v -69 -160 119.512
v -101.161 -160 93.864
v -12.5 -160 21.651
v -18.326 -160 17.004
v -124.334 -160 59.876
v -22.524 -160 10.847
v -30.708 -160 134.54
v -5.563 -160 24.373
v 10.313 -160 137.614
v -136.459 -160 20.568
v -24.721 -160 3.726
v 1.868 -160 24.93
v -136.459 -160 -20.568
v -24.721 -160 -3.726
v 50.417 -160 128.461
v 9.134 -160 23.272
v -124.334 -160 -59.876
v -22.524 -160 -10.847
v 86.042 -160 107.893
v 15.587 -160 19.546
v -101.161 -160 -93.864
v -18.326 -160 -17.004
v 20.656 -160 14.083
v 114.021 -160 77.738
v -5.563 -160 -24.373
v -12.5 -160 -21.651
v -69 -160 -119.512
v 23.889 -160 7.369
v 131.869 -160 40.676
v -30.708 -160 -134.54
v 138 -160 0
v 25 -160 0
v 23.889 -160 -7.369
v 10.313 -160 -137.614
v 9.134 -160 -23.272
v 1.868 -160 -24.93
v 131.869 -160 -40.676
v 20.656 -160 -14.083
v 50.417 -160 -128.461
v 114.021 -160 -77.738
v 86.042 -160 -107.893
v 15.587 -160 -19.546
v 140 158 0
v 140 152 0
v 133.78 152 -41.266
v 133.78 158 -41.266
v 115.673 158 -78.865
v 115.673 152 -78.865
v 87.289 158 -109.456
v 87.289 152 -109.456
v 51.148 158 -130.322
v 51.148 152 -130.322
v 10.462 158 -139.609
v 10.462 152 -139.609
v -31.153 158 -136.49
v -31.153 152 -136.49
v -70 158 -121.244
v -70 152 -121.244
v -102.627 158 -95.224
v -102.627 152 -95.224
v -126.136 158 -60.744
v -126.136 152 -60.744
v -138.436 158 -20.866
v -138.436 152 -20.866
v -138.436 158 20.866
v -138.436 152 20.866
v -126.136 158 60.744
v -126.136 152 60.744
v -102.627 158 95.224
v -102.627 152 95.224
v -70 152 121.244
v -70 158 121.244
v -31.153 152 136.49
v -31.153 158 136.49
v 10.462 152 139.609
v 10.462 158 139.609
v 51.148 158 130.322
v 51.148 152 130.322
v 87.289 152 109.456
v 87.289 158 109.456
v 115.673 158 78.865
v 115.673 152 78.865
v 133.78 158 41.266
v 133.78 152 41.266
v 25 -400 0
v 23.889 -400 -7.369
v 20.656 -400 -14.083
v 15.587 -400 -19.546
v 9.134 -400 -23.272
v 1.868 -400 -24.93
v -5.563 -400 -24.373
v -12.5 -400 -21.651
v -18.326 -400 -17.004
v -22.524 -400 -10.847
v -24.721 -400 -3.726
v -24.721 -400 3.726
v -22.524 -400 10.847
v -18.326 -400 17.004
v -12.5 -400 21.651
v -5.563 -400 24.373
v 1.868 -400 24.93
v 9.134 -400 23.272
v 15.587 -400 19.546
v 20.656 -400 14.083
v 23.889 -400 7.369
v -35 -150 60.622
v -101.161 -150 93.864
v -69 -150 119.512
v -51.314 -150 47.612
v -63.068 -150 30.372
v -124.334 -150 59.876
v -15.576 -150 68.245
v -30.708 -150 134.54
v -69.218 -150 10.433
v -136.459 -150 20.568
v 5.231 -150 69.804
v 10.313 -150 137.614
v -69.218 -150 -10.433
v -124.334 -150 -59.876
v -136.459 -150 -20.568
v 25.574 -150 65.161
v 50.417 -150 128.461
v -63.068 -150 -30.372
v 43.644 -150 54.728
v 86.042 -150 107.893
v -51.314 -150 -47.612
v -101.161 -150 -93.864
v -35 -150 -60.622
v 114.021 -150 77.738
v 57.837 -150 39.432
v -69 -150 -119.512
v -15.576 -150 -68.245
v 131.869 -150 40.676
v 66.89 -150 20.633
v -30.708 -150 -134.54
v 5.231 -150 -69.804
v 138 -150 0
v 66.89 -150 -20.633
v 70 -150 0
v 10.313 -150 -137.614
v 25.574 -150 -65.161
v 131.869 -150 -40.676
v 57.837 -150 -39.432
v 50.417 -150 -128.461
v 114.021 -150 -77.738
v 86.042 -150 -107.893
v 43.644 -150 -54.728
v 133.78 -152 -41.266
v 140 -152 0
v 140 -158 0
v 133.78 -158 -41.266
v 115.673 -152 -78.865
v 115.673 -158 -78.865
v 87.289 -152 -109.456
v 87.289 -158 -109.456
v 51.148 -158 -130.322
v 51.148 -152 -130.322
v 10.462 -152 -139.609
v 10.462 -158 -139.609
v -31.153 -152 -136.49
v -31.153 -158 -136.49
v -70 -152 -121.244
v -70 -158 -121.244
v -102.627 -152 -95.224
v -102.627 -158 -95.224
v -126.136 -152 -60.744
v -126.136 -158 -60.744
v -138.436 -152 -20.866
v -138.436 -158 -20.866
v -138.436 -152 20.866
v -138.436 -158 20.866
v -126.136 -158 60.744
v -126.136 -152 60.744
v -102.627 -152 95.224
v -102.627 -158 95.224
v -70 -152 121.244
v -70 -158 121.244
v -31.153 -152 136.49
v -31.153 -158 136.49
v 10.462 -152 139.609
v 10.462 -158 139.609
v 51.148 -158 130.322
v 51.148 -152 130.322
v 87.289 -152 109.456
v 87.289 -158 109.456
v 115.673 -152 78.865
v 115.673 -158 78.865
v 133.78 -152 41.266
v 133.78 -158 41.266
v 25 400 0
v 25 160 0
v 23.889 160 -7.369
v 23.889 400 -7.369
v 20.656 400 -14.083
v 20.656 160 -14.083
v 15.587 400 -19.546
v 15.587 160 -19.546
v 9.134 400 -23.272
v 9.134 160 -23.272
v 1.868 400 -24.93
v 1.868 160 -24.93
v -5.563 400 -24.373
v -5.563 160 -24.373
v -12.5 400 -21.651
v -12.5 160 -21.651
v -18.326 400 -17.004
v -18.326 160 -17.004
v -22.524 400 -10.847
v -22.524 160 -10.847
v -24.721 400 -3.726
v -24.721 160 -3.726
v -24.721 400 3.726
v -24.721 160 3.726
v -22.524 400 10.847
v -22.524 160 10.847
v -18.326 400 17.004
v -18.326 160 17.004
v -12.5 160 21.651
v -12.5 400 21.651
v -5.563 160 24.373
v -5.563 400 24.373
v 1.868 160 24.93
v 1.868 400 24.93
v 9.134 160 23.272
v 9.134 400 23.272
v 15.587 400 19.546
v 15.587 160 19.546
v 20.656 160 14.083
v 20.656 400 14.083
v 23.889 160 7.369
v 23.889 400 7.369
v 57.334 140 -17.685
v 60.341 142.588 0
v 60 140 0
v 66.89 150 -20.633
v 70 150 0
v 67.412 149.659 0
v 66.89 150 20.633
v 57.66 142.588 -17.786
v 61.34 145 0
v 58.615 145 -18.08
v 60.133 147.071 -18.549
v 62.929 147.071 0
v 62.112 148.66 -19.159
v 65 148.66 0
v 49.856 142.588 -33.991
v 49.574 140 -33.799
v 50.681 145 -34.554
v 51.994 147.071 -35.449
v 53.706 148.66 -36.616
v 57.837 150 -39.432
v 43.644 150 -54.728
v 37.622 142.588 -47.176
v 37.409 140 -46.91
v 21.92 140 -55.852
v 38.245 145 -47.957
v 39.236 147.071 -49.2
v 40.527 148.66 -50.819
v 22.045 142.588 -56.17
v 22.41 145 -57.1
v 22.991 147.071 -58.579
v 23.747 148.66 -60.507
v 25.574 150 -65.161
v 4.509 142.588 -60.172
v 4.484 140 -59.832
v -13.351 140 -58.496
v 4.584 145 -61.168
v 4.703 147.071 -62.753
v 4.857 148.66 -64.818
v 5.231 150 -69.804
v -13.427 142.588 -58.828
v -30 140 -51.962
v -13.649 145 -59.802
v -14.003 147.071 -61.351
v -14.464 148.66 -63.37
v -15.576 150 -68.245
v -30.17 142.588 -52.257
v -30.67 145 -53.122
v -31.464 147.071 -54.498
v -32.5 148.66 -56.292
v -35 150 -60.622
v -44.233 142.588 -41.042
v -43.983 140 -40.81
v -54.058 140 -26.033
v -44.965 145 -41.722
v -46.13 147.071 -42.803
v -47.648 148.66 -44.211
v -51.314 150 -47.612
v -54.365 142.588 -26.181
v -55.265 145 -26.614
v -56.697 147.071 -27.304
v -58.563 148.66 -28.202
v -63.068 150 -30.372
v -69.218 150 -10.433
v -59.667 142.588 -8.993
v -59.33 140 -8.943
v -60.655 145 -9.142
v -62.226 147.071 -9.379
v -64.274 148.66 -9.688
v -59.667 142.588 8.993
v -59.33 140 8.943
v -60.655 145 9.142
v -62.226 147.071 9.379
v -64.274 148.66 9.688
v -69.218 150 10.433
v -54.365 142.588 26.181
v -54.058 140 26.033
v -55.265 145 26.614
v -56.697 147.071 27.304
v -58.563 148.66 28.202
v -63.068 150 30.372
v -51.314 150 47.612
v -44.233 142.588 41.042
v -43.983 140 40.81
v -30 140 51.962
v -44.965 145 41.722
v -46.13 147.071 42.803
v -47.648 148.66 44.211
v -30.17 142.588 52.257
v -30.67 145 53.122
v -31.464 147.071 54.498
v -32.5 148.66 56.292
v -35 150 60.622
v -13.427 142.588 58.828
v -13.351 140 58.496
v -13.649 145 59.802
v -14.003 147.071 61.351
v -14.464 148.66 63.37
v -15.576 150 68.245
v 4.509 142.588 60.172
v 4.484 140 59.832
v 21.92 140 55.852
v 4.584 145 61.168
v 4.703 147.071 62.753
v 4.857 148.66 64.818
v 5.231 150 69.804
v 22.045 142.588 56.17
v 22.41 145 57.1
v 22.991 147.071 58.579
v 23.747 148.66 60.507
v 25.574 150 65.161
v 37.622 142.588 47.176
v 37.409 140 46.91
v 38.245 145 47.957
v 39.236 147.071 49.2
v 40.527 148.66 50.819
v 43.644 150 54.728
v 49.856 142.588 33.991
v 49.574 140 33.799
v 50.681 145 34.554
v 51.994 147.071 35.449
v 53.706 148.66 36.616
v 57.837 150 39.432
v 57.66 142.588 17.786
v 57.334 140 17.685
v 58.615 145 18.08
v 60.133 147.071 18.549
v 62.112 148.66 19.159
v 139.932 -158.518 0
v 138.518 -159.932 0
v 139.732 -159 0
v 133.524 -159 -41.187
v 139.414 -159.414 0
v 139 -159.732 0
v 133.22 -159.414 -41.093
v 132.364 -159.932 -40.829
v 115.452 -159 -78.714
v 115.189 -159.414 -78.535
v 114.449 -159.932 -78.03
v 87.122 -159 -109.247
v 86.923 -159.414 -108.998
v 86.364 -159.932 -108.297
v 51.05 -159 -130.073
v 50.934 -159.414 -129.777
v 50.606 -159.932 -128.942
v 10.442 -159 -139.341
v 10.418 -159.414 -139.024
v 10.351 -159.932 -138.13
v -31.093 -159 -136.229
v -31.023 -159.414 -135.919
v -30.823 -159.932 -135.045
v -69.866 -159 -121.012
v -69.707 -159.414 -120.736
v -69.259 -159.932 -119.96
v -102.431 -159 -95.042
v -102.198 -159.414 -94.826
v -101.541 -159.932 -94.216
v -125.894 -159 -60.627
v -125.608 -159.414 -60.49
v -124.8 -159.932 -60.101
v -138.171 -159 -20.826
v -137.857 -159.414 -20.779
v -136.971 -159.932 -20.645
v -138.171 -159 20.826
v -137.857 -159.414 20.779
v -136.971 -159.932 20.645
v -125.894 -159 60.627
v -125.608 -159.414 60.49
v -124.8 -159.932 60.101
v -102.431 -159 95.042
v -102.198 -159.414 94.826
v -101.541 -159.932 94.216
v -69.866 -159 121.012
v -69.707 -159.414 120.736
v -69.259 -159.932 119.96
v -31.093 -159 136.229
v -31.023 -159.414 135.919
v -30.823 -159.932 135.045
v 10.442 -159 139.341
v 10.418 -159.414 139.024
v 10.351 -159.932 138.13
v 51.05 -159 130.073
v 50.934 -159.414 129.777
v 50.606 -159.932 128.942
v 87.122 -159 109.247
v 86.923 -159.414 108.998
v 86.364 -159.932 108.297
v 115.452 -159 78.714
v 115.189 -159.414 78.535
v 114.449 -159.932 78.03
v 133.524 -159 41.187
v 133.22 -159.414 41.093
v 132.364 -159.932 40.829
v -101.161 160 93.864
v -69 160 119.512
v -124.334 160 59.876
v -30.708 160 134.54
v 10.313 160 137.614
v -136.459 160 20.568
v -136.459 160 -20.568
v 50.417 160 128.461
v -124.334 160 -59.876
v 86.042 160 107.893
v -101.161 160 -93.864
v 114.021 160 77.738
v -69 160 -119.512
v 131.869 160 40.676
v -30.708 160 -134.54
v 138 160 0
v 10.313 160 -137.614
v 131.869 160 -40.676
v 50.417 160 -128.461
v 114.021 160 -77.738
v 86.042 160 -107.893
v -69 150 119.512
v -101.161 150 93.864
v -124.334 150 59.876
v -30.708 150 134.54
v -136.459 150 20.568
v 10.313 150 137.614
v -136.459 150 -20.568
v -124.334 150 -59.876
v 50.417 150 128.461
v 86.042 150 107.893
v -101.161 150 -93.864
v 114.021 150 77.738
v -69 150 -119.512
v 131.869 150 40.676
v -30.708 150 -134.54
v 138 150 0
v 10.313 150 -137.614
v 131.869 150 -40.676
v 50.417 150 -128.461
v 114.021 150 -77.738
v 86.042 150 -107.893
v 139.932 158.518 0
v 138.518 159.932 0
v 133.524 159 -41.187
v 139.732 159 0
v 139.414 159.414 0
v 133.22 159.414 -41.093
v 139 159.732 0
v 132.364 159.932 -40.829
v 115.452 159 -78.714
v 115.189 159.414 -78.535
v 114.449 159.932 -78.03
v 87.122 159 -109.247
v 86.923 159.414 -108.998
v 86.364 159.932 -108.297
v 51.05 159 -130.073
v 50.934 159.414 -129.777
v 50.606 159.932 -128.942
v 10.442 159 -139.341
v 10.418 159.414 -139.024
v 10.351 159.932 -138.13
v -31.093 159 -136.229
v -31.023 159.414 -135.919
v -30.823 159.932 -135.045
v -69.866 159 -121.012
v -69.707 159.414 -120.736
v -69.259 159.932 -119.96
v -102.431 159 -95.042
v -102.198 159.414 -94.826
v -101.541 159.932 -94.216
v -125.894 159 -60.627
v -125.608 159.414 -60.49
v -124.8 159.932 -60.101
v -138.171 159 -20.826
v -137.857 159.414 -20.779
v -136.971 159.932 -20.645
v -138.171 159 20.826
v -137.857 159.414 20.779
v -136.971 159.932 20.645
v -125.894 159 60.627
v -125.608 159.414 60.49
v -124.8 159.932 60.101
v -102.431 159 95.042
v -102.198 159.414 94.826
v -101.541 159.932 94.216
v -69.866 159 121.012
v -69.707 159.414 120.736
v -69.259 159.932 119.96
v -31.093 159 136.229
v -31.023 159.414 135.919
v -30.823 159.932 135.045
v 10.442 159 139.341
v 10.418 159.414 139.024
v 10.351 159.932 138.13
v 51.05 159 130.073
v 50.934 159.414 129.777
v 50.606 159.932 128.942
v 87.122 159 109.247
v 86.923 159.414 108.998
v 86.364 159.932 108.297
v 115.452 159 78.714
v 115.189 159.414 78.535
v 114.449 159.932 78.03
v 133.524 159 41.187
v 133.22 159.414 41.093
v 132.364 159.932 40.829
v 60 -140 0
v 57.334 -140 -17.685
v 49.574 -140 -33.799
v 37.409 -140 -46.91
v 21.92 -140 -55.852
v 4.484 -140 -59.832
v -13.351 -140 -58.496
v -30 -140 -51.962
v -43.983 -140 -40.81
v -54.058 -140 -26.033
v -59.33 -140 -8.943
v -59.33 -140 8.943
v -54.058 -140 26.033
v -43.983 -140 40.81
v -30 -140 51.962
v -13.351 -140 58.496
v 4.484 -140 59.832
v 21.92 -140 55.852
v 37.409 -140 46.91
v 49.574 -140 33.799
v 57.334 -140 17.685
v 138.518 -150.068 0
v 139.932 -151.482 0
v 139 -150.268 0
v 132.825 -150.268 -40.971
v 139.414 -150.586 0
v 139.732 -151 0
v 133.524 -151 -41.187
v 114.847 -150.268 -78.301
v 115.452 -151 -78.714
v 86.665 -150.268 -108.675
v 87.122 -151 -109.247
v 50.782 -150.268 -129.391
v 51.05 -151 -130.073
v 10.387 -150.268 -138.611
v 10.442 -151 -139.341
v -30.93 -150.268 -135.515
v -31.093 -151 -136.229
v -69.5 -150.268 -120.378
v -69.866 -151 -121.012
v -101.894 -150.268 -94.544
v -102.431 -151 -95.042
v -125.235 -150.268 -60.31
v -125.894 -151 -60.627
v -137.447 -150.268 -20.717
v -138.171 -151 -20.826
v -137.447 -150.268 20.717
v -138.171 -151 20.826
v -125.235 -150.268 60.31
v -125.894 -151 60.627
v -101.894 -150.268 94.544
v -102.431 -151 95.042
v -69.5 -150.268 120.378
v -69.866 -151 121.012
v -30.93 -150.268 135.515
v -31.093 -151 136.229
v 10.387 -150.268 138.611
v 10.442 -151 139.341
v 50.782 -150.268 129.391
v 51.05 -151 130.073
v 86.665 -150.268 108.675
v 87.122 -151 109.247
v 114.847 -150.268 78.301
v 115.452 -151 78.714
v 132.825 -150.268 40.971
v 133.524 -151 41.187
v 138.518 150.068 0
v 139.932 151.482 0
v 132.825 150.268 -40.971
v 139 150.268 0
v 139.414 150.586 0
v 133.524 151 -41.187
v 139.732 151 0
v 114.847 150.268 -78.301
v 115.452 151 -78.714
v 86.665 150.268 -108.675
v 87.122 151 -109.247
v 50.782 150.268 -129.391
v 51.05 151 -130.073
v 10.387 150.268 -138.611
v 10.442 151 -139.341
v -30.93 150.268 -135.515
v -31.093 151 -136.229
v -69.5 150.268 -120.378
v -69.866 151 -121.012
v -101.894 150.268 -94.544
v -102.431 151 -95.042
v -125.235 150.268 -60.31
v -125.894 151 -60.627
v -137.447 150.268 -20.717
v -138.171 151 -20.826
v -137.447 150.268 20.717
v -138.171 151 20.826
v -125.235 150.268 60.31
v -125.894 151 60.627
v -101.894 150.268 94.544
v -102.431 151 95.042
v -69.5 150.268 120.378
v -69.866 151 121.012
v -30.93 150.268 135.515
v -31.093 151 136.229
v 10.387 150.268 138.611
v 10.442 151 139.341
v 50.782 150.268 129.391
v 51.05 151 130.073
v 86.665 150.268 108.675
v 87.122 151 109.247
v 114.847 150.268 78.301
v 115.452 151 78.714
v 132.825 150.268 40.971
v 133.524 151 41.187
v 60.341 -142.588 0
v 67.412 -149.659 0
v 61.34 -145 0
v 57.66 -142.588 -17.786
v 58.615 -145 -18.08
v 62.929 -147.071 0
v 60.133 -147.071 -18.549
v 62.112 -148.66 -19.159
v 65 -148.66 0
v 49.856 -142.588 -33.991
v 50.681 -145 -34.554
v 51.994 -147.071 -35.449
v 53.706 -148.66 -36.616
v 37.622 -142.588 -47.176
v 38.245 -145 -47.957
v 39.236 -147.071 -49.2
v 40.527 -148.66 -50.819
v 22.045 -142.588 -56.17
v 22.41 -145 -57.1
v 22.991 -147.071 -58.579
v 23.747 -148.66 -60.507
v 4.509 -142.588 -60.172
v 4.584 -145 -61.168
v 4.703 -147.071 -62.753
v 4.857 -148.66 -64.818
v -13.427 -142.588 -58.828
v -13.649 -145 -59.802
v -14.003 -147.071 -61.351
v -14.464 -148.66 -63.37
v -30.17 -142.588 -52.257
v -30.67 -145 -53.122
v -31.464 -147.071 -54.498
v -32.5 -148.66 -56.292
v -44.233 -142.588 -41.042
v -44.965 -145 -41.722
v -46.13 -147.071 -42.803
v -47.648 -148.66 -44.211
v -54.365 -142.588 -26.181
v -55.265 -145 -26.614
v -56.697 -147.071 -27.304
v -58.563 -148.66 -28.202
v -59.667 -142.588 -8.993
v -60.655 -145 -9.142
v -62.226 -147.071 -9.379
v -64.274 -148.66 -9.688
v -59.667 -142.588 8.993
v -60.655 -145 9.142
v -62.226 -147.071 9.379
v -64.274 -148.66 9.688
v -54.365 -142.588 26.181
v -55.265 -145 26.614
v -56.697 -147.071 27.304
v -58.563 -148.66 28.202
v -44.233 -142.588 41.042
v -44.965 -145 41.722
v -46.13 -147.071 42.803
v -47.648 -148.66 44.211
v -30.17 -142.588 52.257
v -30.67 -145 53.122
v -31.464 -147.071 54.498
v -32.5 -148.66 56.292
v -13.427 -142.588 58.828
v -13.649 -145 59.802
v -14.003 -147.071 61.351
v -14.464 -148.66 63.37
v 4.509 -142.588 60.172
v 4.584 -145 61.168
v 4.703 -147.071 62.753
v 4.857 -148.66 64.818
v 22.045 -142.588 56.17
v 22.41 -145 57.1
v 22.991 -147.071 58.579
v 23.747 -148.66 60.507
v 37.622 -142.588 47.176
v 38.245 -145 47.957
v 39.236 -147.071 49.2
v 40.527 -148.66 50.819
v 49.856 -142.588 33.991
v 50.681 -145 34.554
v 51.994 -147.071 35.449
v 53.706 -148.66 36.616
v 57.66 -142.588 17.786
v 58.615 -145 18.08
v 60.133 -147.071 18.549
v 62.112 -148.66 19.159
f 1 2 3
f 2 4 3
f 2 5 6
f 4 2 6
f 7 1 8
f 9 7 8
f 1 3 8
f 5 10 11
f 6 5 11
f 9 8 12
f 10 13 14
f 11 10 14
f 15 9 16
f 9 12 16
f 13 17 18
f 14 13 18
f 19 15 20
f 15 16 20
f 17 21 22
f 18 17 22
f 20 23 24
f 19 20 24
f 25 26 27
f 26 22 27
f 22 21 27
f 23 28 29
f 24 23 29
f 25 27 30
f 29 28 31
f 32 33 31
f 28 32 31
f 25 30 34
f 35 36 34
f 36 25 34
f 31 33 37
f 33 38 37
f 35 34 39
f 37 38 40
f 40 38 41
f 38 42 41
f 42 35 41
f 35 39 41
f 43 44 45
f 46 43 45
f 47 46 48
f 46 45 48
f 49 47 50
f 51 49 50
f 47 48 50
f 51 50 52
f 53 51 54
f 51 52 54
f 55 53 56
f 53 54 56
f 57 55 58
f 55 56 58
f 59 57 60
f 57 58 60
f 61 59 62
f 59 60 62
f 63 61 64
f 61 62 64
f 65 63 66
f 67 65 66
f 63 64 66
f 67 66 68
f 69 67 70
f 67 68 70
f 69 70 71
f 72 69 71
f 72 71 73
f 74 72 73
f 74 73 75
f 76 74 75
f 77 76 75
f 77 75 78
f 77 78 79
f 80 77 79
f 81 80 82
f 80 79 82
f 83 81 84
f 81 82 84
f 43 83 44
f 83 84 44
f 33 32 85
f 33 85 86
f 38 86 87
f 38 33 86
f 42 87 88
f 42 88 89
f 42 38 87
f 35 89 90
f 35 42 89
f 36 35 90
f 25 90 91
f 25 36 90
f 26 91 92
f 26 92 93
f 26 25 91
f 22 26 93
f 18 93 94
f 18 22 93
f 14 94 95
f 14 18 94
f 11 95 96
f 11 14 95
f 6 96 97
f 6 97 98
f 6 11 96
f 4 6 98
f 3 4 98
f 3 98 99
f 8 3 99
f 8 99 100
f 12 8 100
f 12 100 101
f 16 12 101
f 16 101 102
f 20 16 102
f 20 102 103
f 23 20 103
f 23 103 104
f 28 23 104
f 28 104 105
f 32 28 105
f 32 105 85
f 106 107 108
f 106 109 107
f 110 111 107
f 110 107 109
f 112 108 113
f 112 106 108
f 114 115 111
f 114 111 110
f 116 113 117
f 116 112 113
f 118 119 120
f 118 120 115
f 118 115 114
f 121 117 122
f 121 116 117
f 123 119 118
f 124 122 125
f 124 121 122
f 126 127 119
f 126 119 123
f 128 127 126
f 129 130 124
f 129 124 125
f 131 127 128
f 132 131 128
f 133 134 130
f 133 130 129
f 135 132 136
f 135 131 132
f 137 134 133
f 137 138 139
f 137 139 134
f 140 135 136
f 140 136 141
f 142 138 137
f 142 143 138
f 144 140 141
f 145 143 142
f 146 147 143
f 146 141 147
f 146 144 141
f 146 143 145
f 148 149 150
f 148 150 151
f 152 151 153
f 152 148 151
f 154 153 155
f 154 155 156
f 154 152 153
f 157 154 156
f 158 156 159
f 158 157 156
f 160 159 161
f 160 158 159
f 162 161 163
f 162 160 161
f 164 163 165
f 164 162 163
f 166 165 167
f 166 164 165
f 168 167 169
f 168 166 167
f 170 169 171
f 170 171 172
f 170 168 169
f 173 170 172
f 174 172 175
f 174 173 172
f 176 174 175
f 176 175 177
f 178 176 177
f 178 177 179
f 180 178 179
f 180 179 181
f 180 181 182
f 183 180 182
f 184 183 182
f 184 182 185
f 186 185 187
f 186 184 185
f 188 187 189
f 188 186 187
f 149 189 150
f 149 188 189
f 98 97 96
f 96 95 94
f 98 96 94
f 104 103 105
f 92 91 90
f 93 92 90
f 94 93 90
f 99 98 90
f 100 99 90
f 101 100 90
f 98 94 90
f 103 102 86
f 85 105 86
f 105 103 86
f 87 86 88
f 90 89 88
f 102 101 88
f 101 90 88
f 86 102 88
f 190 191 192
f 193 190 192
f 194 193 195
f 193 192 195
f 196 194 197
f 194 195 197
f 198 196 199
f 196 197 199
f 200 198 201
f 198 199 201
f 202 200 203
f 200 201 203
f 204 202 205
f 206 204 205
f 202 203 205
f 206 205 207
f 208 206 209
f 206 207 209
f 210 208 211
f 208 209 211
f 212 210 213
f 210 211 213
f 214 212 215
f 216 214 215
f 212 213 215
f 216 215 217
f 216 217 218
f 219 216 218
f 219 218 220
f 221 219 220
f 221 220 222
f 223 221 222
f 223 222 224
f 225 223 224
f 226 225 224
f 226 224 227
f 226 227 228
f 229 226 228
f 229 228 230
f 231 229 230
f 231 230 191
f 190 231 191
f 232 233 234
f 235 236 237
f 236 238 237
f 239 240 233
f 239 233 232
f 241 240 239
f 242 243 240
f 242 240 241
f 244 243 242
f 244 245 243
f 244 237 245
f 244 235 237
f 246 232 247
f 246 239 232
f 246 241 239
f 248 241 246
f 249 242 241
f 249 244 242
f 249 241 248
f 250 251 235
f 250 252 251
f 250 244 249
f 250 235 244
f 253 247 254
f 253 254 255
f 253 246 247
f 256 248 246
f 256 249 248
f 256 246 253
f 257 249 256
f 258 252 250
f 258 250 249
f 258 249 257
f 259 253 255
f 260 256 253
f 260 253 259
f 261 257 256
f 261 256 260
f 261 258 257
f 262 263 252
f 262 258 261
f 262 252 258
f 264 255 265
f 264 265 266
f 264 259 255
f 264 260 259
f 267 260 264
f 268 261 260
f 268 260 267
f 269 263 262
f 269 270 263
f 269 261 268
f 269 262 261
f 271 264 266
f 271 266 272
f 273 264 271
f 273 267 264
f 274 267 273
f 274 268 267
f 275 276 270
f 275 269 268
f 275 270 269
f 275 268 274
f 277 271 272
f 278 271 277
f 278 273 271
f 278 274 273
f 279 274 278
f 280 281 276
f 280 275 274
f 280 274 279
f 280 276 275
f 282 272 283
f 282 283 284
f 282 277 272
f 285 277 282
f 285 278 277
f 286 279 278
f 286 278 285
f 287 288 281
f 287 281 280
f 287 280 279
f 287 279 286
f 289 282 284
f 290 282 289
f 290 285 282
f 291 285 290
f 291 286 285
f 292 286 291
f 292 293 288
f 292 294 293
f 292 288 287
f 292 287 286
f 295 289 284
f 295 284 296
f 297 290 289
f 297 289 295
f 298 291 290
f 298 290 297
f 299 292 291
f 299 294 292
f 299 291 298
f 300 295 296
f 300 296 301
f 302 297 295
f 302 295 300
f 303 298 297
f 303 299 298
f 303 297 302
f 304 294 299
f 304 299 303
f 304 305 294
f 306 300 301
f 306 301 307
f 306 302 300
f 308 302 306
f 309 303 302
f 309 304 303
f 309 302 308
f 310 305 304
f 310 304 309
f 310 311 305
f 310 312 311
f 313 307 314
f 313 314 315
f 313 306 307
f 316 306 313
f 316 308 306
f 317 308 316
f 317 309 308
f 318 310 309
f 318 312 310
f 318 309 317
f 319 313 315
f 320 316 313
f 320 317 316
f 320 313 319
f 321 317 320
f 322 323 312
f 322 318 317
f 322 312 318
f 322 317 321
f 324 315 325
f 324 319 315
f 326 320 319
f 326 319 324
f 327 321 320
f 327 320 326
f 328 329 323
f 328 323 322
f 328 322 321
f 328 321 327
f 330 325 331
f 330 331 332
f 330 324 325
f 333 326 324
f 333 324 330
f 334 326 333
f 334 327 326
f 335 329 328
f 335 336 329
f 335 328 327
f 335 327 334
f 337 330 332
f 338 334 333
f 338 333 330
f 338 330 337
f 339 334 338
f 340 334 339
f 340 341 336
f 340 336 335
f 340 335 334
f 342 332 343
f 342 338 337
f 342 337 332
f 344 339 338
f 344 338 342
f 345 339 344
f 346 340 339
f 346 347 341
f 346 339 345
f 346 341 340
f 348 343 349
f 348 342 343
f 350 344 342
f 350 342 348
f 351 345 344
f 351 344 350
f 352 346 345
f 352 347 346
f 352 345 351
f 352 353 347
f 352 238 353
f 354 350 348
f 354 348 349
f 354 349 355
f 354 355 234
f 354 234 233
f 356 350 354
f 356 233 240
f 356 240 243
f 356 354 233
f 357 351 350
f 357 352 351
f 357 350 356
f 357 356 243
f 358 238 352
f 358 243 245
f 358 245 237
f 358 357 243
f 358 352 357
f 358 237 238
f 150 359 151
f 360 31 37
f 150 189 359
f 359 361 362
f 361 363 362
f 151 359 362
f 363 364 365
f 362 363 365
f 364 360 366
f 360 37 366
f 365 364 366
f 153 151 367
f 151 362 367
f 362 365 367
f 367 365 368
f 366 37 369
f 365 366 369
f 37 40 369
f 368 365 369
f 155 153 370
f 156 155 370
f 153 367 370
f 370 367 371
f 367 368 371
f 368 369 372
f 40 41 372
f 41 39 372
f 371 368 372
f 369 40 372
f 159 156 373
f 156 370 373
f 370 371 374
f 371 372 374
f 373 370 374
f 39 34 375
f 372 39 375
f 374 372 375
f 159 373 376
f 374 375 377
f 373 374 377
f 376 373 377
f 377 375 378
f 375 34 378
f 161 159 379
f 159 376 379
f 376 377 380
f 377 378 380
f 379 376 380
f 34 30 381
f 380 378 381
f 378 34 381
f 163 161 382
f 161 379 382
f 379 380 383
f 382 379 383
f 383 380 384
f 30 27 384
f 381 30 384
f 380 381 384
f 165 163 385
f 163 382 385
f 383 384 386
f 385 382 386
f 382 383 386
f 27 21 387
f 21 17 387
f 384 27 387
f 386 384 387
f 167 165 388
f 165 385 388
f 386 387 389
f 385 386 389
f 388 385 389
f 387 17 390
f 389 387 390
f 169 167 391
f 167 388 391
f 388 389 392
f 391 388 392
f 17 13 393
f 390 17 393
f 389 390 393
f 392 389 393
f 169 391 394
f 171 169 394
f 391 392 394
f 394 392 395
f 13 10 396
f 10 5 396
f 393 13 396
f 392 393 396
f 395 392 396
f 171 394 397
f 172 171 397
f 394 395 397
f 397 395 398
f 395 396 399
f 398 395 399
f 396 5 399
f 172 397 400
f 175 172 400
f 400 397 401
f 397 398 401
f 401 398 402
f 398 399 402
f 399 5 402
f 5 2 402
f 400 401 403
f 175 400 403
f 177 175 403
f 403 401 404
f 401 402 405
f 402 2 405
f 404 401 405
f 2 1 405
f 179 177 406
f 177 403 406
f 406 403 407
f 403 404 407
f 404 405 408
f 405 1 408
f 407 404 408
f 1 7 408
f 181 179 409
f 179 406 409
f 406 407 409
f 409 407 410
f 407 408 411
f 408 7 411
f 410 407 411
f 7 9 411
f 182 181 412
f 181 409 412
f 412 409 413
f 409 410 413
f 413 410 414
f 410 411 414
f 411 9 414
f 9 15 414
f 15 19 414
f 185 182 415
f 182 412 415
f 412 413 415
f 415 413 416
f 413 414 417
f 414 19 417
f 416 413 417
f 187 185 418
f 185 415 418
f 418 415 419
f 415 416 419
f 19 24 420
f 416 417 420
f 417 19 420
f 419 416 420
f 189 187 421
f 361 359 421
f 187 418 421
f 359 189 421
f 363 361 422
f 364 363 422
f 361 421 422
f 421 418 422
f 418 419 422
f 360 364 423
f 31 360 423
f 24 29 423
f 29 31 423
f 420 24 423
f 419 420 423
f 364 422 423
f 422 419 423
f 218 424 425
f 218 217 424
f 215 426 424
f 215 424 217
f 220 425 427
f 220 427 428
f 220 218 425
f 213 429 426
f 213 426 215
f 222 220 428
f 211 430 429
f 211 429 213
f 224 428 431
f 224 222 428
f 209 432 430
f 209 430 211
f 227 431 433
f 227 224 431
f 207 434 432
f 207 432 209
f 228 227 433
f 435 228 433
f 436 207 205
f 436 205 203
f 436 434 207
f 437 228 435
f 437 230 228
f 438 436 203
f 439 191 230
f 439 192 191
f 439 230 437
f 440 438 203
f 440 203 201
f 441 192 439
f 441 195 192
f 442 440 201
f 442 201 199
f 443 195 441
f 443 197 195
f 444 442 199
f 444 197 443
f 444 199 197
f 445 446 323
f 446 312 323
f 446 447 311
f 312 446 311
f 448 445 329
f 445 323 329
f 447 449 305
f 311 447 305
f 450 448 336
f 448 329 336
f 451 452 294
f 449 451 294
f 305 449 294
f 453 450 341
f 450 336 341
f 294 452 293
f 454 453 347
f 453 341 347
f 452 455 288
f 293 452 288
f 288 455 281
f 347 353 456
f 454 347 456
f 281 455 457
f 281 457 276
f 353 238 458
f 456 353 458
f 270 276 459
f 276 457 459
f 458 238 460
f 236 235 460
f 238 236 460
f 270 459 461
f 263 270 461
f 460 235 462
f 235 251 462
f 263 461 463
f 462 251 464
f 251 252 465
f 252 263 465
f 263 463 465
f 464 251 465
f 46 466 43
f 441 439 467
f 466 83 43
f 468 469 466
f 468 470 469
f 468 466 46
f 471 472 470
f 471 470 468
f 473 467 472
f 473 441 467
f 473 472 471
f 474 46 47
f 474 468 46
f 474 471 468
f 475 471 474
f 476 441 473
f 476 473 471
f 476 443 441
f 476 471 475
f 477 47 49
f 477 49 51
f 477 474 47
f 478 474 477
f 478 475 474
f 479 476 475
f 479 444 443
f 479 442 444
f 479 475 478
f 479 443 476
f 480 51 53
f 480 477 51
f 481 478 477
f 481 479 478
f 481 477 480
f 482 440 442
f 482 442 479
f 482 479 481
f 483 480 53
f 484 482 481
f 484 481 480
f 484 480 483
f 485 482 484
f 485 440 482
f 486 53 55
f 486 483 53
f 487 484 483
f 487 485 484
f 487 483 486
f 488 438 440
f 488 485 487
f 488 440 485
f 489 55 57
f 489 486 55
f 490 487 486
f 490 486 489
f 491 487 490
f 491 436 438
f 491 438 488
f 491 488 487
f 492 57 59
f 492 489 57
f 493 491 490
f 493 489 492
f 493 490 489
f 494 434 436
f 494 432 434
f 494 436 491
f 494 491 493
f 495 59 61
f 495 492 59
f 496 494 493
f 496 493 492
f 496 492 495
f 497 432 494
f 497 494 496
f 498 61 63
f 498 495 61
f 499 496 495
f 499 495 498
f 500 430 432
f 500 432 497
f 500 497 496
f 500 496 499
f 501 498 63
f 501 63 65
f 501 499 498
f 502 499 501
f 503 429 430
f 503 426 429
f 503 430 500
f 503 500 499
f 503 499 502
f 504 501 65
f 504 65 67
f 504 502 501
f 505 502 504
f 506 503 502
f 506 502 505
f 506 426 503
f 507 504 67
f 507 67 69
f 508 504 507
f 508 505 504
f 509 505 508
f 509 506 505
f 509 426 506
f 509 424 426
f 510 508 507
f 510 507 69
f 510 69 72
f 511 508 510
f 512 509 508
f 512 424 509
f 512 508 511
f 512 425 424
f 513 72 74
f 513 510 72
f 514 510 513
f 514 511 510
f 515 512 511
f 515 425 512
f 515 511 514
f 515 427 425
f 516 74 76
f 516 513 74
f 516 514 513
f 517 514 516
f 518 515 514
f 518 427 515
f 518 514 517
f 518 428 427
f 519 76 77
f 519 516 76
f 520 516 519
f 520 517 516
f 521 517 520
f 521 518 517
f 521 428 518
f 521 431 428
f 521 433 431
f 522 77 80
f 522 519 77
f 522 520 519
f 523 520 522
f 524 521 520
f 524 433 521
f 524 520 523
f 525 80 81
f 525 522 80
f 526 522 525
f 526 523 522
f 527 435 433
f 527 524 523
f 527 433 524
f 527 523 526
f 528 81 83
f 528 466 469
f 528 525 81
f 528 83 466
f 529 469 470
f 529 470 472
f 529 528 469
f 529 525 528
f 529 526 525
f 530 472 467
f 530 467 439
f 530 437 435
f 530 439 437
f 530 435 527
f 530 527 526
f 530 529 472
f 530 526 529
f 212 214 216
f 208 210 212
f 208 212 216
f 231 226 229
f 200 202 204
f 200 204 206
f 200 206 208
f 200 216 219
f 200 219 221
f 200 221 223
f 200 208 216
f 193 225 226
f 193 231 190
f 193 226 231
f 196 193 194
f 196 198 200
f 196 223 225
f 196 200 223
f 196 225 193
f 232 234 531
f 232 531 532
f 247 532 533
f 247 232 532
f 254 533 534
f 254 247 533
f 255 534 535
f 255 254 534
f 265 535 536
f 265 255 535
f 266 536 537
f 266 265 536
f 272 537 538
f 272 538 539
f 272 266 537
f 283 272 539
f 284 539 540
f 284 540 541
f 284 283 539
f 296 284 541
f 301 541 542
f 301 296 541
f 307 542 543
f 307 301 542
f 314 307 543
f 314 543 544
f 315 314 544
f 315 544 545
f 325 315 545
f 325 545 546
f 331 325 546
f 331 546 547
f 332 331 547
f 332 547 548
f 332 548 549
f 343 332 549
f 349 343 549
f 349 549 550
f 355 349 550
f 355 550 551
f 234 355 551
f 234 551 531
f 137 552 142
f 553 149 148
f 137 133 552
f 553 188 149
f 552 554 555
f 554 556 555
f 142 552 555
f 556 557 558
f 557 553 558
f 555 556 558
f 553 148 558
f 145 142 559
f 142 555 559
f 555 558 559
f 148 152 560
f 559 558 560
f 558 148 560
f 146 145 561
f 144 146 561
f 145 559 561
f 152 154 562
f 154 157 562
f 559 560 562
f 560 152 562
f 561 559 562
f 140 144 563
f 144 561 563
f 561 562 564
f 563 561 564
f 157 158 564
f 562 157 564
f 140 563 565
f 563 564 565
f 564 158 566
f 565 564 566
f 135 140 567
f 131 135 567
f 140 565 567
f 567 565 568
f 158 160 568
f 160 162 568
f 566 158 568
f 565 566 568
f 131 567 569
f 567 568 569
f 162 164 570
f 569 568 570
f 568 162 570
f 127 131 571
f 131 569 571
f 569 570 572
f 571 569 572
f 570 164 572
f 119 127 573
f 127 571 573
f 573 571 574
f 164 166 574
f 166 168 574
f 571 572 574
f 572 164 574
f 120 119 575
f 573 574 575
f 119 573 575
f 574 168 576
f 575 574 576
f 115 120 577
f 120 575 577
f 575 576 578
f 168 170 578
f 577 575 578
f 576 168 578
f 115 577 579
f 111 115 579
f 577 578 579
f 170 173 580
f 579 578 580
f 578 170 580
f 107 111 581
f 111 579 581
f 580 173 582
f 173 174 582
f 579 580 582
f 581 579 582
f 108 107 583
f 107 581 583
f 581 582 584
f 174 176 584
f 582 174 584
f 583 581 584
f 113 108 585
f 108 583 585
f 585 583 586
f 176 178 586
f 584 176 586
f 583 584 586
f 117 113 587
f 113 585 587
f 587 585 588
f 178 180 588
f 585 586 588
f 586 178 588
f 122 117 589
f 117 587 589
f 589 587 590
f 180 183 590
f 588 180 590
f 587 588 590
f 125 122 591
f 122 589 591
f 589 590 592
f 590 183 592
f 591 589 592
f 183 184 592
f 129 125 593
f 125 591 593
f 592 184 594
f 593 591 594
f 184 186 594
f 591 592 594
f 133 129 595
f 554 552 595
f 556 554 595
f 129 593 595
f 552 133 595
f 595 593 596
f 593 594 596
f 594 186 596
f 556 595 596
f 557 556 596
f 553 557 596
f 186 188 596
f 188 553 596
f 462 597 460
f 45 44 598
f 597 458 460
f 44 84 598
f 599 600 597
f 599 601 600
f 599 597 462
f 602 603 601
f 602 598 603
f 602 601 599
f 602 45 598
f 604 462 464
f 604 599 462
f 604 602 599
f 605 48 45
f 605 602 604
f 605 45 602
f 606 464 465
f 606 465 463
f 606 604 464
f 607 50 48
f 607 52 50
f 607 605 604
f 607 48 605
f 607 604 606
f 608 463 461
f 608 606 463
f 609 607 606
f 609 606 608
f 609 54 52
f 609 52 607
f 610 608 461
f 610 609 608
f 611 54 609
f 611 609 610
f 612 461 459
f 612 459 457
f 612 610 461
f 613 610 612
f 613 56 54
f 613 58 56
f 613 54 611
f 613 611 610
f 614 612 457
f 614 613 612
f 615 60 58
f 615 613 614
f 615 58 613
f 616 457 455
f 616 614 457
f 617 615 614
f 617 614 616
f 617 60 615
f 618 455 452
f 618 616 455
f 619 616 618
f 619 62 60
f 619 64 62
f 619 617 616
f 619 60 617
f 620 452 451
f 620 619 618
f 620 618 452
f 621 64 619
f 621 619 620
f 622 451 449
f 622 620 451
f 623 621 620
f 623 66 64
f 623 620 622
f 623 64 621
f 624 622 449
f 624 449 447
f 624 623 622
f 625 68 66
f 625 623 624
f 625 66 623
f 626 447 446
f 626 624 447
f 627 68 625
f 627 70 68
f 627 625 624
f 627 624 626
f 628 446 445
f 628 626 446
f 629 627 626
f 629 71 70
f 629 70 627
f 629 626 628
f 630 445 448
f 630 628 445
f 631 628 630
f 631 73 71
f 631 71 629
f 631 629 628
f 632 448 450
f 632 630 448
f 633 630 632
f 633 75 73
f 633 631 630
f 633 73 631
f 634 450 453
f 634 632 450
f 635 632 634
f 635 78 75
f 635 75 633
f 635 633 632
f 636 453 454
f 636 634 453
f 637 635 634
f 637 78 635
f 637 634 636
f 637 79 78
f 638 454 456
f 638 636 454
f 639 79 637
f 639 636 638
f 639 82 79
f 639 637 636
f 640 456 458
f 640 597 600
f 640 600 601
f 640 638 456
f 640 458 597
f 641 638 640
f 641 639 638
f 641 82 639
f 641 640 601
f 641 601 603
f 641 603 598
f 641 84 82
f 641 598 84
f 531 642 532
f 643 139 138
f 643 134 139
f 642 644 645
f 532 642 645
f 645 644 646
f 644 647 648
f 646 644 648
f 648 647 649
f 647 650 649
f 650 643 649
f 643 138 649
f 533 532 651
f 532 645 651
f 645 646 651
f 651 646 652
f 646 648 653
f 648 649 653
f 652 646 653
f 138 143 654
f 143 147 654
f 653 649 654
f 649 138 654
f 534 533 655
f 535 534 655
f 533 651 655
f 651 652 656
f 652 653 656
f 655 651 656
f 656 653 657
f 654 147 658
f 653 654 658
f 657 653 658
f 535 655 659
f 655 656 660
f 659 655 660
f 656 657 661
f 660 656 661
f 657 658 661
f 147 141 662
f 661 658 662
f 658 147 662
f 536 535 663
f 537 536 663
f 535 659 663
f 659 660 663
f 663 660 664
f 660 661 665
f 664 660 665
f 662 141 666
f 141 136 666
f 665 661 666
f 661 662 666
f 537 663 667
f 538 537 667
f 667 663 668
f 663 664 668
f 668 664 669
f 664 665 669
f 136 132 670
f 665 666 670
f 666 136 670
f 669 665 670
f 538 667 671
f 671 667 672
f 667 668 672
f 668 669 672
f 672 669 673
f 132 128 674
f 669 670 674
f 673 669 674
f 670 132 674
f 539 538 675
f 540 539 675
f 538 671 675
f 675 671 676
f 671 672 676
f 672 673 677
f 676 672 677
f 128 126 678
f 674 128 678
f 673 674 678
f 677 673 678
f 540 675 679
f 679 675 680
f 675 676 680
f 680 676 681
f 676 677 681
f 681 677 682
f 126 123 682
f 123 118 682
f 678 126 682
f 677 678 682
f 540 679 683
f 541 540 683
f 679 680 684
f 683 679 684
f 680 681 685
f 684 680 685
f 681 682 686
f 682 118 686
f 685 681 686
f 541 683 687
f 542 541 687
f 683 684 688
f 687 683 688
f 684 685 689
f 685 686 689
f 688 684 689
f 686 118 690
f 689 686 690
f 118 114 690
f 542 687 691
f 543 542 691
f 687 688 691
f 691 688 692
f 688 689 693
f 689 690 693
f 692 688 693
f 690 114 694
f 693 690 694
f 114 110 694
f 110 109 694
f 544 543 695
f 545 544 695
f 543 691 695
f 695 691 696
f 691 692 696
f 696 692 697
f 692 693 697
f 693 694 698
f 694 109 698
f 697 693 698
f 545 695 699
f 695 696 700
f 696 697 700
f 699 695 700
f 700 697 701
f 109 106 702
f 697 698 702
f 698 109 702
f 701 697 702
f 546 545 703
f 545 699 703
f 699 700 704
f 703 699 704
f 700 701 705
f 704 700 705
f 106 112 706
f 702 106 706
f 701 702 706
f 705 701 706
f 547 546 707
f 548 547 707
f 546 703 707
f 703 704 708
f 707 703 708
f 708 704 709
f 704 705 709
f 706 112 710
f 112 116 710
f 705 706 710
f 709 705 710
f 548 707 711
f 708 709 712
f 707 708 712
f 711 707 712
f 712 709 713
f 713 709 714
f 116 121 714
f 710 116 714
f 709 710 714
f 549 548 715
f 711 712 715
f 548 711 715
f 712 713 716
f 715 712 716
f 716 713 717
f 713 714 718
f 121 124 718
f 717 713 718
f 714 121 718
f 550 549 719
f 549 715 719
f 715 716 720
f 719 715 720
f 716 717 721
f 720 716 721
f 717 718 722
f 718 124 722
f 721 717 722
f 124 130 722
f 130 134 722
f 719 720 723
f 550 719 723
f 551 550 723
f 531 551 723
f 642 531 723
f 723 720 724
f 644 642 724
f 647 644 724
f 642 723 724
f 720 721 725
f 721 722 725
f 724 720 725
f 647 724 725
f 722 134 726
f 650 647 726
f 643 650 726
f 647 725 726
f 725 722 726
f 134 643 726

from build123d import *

# Parameters (mm, degrees)
BOSS_EXTRUDE1_DEPTH      = 150
BOSS_EXTRUDE1_DEPTH_BACK = 150
SKETCH1_R                = 60
SKETCH2_R                = 140
BOSS_EXTRUDE2_DEPTH      = 10
BOSS_EXTRUDE3_DEPTH      = 400
BOSS_EXTRUDE3_DEPTH_BACK = 400
SKETCH3_R                = 25
FILLET1_R                = 10
FILLET2_R                = 10
FILLET3_R                = 2
FILLET4_R                = 2
FILLET5_R                = 2
FILLET6_R                = 2


with BuildPart() as part:
    # Sketch1 → Boss-Extrude1 (new, two sides: drawn at the far end of the back side and taken through both)
    with BuildSketch(Plane(origin=(0, 0, 0), x_dir=(1, 0, 0), z_dir=(0, 1, 0)).offset(-BOSS_EXTRUDE1_DEPTH_BACK)):
        Circle(SKETCH1_R)
    extrude(amount=BOSS_EXTRUDE1_DEPTH + BOSS_EXTRUDE1_DEPTH_BACK)

    # Sketch2 → Boss-Extrude2 (add)
    with BuildSketch(Plane(origin=(0, 150, 0), x_dir=(1, 0, 0), z_dir=(0, 1, 0))):
        Circle(SKETCH2_R)
    boss_extrude2 = extrude(amount=BOSS_EXTRUDE2_DEPTH)

    # Mirror1: Boss-Extrude2 across plane
    add(boss_extrude2.mirror(Plane.ZX))

    # Sketch3 → Boss-Extrude3 (add, two sides: drawn at the far end of the back side and taken through both)
    with BuildSketch(Plane(origin=(0, 0, 0), x_dir=(1, 0, 0), z_dir=(0, 1, 0)).offset(-BOSS_EXTRUDE3_DEPTH_BACK)):
        Circle(SKETCH3_R)
    extrude(amount=BOSS_EXTRUDE3_DEPTH + BOSS_EXTRUDE3_DEPTH_BACK)

    # Fillet1
    fillet1_edges = [part.edges().sort_by_distance(p)[0] for p in [
        (-60, 150, 0),
    ]]
    fillet(fillet1_edges, radius=FILLET1_R)

    # Fillet2
    fillet2_edges = [part.edges().sort_by_distance(p)[0] for p in [
        (-60, -150, 0),
    ]]
    fillet(fillet2_edges, radius=FILLET2_R)

    # Fillet3
    fillet3_edges = [part.edges().sort_by_distance(p)[0] for p in [
        (-140, 150, 0),
    ]]
    fillet(fillet3_edges, radius=FILLET3_R)

    # Fillet4
    fillet4_edges = [part.edges().sort_by_distance(p)[0] for p in [
        (-140, -150, 0),
    ]]
    fillet(fillet4_edges, radius=FILLET4_R)

    # Fillet5
    fillet5_edges = [part.edges().sort_by_distance(p)[0] for p in [
        (-140, 160, 0),
    ]]
    fillet(fillet5_edges, radius=FILLET5_R)

    # Fillet6
    fillet6_edges = [part.edges().sort_by_distance(p)[0] for p in [
        (-140, -160, 0),
    ]]
    fillet(fillet6_edges, radius=FILLET6_R)


solid = part.part
